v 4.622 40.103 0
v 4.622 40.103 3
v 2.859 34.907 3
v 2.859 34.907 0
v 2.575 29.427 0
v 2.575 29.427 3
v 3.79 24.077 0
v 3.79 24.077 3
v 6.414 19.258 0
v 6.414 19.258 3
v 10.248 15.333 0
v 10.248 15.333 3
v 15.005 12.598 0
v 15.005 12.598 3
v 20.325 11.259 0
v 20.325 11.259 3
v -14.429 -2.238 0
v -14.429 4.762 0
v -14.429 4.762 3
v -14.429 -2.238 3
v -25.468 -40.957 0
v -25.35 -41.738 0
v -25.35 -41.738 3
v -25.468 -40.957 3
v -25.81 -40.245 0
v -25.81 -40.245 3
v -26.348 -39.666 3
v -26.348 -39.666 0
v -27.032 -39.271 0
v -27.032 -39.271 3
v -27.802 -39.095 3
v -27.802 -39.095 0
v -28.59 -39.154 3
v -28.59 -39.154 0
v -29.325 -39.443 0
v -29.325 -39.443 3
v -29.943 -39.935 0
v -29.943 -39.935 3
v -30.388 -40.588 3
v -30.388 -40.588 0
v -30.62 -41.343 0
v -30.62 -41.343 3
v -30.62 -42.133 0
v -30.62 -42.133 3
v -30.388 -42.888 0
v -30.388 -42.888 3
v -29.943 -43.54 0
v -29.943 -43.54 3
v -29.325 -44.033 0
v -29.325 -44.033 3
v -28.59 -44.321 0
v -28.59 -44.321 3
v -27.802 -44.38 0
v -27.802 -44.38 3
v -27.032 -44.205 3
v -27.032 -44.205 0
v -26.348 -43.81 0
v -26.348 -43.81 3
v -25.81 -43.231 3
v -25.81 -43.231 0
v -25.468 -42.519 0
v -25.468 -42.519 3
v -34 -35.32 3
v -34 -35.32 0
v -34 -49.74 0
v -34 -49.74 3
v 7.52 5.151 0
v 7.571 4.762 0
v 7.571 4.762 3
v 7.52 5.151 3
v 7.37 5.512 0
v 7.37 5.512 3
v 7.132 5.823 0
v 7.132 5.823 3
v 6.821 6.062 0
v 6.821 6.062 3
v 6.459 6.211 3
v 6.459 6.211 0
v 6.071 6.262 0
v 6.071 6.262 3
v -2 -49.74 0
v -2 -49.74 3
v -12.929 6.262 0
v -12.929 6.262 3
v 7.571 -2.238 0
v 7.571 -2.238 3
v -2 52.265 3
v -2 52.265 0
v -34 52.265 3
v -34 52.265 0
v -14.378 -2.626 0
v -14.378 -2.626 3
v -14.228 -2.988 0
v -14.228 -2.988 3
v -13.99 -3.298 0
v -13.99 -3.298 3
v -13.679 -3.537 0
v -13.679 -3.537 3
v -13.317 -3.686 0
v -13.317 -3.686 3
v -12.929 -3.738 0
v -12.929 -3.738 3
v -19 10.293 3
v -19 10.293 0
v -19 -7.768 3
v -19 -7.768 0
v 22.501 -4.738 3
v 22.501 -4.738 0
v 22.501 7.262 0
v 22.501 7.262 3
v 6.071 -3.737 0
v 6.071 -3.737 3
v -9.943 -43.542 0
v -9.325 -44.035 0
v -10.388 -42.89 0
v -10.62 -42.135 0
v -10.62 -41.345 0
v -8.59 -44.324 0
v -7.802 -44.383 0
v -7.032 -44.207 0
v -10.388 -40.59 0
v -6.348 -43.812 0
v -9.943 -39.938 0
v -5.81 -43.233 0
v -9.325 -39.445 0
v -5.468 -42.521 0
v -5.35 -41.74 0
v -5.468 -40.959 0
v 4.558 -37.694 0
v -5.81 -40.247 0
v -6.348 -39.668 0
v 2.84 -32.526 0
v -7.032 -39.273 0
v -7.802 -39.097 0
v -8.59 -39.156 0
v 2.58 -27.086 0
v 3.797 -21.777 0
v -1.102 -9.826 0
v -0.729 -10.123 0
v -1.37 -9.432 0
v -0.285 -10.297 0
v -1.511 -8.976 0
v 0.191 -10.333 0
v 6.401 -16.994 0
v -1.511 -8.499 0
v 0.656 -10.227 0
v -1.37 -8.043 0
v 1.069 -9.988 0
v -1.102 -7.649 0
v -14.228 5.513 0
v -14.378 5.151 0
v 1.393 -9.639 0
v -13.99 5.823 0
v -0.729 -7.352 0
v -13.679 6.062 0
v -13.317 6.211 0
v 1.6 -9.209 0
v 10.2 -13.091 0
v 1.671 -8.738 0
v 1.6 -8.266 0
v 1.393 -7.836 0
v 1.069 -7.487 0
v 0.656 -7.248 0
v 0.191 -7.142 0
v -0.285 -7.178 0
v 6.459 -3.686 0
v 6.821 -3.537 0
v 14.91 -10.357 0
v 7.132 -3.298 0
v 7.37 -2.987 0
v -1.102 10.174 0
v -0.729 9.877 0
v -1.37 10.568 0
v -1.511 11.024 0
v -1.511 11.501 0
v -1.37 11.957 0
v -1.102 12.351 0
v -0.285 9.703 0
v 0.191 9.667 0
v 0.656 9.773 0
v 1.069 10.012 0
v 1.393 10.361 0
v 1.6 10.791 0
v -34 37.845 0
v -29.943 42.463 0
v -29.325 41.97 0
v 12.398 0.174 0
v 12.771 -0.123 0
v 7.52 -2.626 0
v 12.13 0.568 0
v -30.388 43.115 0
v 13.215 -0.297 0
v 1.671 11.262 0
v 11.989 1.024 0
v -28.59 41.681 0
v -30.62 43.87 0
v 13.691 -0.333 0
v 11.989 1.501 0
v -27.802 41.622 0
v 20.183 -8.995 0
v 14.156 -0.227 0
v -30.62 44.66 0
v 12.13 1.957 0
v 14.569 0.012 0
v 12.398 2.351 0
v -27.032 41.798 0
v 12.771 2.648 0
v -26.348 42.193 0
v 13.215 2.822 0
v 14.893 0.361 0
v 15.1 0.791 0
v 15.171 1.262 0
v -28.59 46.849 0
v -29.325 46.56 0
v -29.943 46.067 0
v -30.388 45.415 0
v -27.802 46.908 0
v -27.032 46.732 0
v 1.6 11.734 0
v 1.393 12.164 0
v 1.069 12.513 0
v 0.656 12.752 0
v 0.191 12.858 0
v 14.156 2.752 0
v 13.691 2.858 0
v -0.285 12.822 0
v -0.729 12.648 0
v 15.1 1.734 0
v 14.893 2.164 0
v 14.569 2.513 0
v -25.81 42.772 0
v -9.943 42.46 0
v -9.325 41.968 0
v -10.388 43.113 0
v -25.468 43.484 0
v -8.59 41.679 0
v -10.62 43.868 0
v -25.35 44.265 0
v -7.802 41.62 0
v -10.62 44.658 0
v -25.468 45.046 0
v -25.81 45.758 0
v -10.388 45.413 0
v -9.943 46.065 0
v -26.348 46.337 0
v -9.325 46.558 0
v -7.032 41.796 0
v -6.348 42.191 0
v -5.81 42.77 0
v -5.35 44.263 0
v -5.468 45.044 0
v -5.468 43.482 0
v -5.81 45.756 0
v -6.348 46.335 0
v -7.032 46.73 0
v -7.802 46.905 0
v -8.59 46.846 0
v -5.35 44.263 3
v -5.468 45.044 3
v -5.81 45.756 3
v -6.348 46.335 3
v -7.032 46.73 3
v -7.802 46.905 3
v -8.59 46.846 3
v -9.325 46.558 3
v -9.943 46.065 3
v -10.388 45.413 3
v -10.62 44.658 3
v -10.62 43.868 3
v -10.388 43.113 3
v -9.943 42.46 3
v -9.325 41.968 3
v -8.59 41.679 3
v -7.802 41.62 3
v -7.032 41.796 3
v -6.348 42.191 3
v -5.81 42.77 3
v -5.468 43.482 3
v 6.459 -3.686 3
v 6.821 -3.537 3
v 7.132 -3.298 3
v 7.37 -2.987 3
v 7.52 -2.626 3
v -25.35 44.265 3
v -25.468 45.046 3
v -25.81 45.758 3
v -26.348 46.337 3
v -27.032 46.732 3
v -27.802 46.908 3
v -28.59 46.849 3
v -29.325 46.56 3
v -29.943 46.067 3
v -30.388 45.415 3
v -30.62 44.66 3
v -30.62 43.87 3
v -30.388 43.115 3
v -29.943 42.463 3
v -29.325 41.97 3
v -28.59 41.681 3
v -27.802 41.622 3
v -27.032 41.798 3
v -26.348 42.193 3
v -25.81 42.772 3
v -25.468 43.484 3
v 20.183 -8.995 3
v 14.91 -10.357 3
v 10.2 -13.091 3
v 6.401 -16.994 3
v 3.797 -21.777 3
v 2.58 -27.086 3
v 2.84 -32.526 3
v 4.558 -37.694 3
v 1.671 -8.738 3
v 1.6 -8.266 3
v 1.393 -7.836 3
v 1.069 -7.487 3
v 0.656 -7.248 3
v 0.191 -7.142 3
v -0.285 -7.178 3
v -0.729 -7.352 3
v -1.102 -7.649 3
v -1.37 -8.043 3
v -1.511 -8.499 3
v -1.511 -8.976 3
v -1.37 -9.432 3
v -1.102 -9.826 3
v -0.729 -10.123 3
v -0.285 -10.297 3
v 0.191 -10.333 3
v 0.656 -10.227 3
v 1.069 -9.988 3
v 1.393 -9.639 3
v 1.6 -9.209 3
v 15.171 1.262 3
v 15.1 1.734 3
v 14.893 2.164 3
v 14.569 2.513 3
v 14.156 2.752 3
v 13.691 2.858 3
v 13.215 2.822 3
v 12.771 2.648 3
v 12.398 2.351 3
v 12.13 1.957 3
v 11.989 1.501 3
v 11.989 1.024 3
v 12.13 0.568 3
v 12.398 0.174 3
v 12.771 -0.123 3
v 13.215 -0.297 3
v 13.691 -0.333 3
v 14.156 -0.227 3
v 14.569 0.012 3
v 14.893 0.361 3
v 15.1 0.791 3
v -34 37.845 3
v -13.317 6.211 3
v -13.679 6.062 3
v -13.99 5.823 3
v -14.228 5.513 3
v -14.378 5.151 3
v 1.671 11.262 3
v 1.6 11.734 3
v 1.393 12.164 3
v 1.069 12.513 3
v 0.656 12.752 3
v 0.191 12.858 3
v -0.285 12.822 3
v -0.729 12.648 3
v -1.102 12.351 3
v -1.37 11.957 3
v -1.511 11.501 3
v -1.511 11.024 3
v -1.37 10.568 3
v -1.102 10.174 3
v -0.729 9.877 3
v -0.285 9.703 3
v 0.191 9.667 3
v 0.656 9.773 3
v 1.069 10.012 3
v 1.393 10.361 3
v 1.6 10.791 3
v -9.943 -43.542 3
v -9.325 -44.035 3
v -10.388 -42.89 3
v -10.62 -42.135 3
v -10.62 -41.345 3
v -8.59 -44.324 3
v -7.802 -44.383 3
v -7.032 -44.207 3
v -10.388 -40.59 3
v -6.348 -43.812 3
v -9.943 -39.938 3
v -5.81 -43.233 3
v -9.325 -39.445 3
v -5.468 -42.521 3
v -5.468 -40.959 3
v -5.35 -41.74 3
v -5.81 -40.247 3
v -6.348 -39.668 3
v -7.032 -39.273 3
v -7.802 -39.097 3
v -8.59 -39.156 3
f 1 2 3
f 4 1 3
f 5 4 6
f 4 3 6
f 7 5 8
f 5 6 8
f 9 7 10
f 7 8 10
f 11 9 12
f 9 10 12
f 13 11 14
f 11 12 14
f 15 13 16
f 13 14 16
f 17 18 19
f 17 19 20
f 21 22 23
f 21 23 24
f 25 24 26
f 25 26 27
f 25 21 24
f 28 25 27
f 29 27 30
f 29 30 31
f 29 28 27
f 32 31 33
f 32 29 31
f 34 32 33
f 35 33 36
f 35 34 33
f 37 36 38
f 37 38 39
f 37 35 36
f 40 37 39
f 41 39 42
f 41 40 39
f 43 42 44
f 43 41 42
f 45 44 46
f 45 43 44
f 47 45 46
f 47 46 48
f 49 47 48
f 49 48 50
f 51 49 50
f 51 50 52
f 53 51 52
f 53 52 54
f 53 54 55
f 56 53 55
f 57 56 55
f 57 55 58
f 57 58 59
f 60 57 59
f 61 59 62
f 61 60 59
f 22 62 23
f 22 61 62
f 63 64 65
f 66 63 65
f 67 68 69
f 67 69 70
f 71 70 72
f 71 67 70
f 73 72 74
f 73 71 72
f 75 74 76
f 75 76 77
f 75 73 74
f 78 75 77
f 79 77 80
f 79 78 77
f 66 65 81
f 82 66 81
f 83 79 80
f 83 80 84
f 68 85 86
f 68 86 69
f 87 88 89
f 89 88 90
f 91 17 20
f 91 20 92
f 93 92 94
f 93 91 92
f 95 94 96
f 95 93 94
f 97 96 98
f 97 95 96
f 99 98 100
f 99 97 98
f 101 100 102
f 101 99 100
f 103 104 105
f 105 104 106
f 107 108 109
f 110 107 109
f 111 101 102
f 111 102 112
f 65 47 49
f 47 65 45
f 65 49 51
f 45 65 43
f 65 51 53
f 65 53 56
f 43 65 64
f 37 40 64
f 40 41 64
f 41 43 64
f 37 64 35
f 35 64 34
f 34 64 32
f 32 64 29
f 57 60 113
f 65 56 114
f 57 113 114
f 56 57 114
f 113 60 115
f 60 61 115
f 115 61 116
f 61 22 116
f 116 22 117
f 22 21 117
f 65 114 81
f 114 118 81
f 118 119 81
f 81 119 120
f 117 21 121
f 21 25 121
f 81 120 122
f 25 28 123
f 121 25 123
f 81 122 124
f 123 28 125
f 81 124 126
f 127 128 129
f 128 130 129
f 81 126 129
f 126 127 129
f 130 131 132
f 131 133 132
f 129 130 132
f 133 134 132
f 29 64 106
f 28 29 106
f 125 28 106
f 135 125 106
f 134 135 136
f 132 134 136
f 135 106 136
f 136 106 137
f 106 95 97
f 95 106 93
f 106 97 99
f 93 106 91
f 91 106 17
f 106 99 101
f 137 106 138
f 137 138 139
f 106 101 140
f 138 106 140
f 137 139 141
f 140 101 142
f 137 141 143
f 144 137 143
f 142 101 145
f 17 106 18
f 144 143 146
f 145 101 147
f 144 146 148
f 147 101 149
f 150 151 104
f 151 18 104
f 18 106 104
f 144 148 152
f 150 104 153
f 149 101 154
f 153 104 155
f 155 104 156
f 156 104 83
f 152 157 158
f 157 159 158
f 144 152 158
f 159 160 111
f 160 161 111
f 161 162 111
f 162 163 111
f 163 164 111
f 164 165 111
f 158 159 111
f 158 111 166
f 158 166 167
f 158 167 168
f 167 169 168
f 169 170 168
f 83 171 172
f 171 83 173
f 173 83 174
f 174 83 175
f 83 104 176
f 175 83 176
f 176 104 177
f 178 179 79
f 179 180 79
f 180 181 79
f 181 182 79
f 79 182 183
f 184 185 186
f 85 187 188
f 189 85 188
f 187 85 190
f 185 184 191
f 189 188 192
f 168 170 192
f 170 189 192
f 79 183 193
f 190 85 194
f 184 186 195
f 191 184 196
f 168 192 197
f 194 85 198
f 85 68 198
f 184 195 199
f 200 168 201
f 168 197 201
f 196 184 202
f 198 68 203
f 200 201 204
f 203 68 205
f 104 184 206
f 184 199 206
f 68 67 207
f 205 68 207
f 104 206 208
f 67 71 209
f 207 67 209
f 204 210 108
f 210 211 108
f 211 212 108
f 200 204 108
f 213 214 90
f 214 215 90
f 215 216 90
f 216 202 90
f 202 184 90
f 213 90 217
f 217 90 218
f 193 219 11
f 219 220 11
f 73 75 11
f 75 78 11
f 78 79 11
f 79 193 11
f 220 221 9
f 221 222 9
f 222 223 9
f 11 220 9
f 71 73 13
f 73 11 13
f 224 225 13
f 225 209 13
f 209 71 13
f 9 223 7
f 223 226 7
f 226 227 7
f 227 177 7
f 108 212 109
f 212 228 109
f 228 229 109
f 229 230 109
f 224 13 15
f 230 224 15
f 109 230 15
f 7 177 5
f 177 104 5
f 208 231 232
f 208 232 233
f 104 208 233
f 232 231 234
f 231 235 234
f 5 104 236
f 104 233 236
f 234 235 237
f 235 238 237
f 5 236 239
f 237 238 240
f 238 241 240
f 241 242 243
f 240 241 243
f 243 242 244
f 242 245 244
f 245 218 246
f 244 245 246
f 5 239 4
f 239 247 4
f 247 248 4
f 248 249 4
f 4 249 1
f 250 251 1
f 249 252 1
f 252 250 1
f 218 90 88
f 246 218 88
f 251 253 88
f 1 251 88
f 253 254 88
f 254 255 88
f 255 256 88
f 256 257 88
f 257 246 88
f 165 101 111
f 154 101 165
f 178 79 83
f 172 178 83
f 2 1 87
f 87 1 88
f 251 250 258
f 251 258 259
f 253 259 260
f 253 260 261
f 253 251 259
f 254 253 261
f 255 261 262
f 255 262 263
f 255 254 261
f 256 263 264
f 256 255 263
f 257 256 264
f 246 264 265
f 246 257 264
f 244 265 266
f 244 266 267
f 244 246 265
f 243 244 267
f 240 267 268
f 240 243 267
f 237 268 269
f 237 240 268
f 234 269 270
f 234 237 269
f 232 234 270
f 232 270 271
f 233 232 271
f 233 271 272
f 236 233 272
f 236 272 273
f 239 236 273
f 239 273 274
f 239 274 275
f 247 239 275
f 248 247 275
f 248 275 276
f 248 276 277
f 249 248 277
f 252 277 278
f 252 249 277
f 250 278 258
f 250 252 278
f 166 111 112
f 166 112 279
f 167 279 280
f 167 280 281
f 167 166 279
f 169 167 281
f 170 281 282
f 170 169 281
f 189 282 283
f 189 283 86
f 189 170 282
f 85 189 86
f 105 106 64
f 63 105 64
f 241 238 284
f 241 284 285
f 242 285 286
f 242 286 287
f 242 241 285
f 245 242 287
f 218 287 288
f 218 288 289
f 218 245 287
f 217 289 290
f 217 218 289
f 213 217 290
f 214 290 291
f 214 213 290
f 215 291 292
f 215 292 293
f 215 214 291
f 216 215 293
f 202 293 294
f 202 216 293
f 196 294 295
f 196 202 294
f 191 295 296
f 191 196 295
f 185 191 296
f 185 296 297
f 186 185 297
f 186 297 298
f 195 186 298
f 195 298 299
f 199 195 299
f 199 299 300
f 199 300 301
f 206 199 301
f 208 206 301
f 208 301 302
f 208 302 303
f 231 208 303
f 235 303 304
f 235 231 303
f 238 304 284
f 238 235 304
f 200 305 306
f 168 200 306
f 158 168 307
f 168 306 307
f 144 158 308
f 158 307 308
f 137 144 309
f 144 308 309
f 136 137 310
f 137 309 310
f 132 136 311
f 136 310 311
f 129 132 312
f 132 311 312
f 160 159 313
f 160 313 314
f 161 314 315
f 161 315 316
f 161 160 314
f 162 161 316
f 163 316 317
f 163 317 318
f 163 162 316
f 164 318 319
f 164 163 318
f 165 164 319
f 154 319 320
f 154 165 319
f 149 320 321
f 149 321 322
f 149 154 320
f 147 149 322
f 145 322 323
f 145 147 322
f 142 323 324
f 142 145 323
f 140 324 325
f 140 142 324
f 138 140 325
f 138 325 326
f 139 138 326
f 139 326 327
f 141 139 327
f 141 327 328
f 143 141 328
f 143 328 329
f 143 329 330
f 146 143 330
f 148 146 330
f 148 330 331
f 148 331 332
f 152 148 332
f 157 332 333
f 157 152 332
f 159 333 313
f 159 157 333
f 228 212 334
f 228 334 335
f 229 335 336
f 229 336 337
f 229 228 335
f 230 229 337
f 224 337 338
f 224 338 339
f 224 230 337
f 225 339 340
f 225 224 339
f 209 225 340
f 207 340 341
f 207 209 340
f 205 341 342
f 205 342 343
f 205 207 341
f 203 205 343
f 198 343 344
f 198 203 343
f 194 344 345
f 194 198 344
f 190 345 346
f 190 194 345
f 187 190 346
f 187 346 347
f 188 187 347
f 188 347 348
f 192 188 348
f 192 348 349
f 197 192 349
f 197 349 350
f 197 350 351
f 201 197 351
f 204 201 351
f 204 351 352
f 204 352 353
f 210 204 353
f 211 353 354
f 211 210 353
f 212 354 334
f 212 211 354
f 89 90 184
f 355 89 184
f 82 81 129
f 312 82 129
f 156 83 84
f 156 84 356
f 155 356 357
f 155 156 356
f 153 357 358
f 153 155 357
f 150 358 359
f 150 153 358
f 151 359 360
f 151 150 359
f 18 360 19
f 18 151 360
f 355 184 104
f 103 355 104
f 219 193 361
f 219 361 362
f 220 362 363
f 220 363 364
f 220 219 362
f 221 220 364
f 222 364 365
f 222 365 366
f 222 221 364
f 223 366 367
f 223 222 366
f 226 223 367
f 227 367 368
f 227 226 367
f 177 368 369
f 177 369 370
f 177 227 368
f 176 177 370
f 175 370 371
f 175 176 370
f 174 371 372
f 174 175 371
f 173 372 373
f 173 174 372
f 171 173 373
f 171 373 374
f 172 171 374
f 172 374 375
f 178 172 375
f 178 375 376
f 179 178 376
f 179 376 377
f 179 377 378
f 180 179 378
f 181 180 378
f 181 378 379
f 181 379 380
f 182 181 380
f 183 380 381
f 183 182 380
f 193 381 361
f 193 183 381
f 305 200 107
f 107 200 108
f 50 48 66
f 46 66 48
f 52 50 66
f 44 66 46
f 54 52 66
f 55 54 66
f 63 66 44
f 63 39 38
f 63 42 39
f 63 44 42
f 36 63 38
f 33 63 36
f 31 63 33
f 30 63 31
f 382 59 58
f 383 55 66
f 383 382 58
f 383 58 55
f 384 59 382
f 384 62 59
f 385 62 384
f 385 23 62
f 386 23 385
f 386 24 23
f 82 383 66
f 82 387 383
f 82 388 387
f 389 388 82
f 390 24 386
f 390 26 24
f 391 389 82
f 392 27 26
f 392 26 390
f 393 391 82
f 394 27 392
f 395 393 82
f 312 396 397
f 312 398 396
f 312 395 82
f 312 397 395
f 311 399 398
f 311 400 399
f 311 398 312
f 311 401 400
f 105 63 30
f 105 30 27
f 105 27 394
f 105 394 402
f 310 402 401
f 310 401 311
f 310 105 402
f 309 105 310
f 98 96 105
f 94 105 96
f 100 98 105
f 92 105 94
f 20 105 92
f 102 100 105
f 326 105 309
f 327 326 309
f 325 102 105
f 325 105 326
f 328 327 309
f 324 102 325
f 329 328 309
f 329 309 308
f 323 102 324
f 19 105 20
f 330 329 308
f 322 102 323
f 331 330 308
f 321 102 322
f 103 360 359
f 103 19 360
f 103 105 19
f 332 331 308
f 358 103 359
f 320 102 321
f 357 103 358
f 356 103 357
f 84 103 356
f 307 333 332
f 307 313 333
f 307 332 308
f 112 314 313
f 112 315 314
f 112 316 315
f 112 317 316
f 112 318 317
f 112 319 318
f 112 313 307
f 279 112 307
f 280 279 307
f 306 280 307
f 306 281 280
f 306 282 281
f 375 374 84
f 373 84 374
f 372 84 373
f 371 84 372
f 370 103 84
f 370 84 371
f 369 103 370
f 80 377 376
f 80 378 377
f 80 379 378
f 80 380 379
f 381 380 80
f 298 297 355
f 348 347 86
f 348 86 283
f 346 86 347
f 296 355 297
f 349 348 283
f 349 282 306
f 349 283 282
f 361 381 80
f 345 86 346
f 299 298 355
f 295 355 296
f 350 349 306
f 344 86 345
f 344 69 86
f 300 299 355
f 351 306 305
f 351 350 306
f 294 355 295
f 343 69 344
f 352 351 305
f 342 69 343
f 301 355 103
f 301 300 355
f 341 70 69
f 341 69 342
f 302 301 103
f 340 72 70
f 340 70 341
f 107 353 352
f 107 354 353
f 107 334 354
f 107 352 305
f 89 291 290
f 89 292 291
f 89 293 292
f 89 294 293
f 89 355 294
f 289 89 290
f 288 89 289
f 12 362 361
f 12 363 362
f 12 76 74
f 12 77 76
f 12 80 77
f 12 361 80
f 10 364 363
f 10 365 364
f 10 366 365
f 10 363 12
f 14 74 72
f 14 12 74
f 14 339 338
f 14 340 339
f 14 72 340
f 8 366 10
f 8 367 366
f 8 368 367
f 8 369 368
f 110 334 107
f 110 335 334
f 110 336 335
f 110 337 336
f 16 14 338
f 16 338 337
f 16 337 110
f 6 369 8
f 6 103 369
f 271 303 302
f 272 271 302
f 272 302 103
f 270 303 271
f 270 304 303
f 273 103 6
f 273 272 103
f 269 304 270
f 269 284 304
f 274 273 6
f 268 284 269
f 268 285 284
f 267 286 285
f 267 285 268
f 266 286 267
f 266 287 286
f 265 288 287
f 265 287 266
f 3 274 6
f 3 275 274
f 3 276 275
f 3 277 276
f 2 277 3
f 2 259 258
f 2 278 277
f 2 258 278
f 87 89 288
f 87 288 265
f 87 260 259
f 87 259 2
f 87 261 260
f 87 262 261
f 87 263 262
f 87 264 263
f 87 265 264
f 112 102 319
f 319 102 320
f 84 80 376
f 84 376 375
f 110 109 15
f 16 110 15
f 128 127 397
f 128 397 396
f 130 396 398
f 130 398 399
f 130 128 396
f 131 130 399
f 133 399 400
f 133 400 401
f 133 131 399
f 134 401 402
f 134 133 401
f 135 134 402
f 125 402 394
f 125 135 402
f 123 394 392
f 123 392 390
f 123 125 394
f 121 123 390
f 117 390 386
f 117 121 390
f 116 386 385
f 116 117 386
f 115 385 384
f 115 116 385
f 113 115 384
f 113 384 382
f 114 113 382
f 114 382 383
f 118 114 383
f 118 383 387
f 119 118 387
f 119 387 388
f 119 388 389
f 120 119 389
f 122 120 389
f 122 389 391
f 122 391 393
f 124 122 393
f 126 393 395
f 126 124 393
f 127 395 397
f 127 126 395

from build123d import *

# Parameters (mm, degrees)
SKETCH1_R          = 2.65
SKETCH1_R_2        = 1.6
EXTRUDE1_DEPTH     = 3
SKETCH2_R          = 20
CUT_EXTRUDE1_DEPTH = 3


with BuildPart() as part:
    # Sketch1 → Extrude1 (new body)
    with BuildSketch(Plane.XY):
        Polygon((-33.99999989, 52.265), (-33.99999989, 37.844541986), (-18.99999989, 10.293251102), (-18.99999989, -7.768251102), (-33.99999989, -35.319541986), (-33.99999989, -49.74), (-2, -49.74), (22.501120576, -4.7375), (22.501120576, 7.2625), (-2, 52.265), align=None)
        with Locations((-27.99999989, 44.265)):
            Circle(SKETCH1_R, mode=Mode.SUBTRACT)
        with Locations((-8, 44.262899898)):
            Circle(SKETCH1_R, mode=Mode.SUBTRACT)
        with Locations((-27.99999989, -41.737899898)):
            Circle(SKETCH1_R, mode=Mode.SUBTRACT)
        with Locations((-8, -41.74)):
            Circle(SKETCH1_R, mode=Mode.SUBTRACT)
        with Locations((0.071120582, 11.2625)):
            Circle(SKETCH1_R_2, mode=Mode.SUBTRACT)
        with Locations((13.571120582, 1.2625)):
            Circle(SKETCH1_R_2, mode=Mode.SUBTRACT)
        with Locations((0.071120582, -8.7375)):
            Circle(SKETCH1_R_2, mode=Mode.SUBTRACT)
        with BuildLine():
            Line((7.571120582, -2.2375), (7.571120582, 4.7625))
            ThreePointArc((7.571120582, 4.7625), (7.131780753, 5.823160172), (6.071120582, 6.2625))
            Line((6.071120582, 6.2625), (-12.928879418, 6.2625))
            ThreePointArc((-12.928879418, 6.2625), (-13.98953959, 5.823160172), (-14.428879418, 4.7625))
            Line((-14.428879418, 4.7625), (-14.428879418, -2.2375))
            ThreePointArc((-14.428879418, -2.2375), (-13.98953959, -3.298160172), (-12.928879418, -3.7375))
            Line((-12.928879418, -3.7375), (6.071120582, -3.7375))
            ThreePointArc((6.071120582, -3.7375), (7.131780753, -3.298160172), (7.571120582, -2.2375))
        make_face(mode=Mode.SUBTRACT)
    extrude(amount=EXTRUDE1_DEPTH)

    # Sketch2 → Cut-Extrude1 (cut)
    with BuildSketch(Plane.XY.offset(3)):
        with Locations((22.501120582, 31.14)):
            Circle(SKETCH2_R)
        with Locations((22.501120582, -28.86)):
            Circle(SKETCH2_R)
    extrude(amount=-CUT_EXTRUDE1_DEPTH, mode=Mode.SUBTRACT)


solid = part.part
